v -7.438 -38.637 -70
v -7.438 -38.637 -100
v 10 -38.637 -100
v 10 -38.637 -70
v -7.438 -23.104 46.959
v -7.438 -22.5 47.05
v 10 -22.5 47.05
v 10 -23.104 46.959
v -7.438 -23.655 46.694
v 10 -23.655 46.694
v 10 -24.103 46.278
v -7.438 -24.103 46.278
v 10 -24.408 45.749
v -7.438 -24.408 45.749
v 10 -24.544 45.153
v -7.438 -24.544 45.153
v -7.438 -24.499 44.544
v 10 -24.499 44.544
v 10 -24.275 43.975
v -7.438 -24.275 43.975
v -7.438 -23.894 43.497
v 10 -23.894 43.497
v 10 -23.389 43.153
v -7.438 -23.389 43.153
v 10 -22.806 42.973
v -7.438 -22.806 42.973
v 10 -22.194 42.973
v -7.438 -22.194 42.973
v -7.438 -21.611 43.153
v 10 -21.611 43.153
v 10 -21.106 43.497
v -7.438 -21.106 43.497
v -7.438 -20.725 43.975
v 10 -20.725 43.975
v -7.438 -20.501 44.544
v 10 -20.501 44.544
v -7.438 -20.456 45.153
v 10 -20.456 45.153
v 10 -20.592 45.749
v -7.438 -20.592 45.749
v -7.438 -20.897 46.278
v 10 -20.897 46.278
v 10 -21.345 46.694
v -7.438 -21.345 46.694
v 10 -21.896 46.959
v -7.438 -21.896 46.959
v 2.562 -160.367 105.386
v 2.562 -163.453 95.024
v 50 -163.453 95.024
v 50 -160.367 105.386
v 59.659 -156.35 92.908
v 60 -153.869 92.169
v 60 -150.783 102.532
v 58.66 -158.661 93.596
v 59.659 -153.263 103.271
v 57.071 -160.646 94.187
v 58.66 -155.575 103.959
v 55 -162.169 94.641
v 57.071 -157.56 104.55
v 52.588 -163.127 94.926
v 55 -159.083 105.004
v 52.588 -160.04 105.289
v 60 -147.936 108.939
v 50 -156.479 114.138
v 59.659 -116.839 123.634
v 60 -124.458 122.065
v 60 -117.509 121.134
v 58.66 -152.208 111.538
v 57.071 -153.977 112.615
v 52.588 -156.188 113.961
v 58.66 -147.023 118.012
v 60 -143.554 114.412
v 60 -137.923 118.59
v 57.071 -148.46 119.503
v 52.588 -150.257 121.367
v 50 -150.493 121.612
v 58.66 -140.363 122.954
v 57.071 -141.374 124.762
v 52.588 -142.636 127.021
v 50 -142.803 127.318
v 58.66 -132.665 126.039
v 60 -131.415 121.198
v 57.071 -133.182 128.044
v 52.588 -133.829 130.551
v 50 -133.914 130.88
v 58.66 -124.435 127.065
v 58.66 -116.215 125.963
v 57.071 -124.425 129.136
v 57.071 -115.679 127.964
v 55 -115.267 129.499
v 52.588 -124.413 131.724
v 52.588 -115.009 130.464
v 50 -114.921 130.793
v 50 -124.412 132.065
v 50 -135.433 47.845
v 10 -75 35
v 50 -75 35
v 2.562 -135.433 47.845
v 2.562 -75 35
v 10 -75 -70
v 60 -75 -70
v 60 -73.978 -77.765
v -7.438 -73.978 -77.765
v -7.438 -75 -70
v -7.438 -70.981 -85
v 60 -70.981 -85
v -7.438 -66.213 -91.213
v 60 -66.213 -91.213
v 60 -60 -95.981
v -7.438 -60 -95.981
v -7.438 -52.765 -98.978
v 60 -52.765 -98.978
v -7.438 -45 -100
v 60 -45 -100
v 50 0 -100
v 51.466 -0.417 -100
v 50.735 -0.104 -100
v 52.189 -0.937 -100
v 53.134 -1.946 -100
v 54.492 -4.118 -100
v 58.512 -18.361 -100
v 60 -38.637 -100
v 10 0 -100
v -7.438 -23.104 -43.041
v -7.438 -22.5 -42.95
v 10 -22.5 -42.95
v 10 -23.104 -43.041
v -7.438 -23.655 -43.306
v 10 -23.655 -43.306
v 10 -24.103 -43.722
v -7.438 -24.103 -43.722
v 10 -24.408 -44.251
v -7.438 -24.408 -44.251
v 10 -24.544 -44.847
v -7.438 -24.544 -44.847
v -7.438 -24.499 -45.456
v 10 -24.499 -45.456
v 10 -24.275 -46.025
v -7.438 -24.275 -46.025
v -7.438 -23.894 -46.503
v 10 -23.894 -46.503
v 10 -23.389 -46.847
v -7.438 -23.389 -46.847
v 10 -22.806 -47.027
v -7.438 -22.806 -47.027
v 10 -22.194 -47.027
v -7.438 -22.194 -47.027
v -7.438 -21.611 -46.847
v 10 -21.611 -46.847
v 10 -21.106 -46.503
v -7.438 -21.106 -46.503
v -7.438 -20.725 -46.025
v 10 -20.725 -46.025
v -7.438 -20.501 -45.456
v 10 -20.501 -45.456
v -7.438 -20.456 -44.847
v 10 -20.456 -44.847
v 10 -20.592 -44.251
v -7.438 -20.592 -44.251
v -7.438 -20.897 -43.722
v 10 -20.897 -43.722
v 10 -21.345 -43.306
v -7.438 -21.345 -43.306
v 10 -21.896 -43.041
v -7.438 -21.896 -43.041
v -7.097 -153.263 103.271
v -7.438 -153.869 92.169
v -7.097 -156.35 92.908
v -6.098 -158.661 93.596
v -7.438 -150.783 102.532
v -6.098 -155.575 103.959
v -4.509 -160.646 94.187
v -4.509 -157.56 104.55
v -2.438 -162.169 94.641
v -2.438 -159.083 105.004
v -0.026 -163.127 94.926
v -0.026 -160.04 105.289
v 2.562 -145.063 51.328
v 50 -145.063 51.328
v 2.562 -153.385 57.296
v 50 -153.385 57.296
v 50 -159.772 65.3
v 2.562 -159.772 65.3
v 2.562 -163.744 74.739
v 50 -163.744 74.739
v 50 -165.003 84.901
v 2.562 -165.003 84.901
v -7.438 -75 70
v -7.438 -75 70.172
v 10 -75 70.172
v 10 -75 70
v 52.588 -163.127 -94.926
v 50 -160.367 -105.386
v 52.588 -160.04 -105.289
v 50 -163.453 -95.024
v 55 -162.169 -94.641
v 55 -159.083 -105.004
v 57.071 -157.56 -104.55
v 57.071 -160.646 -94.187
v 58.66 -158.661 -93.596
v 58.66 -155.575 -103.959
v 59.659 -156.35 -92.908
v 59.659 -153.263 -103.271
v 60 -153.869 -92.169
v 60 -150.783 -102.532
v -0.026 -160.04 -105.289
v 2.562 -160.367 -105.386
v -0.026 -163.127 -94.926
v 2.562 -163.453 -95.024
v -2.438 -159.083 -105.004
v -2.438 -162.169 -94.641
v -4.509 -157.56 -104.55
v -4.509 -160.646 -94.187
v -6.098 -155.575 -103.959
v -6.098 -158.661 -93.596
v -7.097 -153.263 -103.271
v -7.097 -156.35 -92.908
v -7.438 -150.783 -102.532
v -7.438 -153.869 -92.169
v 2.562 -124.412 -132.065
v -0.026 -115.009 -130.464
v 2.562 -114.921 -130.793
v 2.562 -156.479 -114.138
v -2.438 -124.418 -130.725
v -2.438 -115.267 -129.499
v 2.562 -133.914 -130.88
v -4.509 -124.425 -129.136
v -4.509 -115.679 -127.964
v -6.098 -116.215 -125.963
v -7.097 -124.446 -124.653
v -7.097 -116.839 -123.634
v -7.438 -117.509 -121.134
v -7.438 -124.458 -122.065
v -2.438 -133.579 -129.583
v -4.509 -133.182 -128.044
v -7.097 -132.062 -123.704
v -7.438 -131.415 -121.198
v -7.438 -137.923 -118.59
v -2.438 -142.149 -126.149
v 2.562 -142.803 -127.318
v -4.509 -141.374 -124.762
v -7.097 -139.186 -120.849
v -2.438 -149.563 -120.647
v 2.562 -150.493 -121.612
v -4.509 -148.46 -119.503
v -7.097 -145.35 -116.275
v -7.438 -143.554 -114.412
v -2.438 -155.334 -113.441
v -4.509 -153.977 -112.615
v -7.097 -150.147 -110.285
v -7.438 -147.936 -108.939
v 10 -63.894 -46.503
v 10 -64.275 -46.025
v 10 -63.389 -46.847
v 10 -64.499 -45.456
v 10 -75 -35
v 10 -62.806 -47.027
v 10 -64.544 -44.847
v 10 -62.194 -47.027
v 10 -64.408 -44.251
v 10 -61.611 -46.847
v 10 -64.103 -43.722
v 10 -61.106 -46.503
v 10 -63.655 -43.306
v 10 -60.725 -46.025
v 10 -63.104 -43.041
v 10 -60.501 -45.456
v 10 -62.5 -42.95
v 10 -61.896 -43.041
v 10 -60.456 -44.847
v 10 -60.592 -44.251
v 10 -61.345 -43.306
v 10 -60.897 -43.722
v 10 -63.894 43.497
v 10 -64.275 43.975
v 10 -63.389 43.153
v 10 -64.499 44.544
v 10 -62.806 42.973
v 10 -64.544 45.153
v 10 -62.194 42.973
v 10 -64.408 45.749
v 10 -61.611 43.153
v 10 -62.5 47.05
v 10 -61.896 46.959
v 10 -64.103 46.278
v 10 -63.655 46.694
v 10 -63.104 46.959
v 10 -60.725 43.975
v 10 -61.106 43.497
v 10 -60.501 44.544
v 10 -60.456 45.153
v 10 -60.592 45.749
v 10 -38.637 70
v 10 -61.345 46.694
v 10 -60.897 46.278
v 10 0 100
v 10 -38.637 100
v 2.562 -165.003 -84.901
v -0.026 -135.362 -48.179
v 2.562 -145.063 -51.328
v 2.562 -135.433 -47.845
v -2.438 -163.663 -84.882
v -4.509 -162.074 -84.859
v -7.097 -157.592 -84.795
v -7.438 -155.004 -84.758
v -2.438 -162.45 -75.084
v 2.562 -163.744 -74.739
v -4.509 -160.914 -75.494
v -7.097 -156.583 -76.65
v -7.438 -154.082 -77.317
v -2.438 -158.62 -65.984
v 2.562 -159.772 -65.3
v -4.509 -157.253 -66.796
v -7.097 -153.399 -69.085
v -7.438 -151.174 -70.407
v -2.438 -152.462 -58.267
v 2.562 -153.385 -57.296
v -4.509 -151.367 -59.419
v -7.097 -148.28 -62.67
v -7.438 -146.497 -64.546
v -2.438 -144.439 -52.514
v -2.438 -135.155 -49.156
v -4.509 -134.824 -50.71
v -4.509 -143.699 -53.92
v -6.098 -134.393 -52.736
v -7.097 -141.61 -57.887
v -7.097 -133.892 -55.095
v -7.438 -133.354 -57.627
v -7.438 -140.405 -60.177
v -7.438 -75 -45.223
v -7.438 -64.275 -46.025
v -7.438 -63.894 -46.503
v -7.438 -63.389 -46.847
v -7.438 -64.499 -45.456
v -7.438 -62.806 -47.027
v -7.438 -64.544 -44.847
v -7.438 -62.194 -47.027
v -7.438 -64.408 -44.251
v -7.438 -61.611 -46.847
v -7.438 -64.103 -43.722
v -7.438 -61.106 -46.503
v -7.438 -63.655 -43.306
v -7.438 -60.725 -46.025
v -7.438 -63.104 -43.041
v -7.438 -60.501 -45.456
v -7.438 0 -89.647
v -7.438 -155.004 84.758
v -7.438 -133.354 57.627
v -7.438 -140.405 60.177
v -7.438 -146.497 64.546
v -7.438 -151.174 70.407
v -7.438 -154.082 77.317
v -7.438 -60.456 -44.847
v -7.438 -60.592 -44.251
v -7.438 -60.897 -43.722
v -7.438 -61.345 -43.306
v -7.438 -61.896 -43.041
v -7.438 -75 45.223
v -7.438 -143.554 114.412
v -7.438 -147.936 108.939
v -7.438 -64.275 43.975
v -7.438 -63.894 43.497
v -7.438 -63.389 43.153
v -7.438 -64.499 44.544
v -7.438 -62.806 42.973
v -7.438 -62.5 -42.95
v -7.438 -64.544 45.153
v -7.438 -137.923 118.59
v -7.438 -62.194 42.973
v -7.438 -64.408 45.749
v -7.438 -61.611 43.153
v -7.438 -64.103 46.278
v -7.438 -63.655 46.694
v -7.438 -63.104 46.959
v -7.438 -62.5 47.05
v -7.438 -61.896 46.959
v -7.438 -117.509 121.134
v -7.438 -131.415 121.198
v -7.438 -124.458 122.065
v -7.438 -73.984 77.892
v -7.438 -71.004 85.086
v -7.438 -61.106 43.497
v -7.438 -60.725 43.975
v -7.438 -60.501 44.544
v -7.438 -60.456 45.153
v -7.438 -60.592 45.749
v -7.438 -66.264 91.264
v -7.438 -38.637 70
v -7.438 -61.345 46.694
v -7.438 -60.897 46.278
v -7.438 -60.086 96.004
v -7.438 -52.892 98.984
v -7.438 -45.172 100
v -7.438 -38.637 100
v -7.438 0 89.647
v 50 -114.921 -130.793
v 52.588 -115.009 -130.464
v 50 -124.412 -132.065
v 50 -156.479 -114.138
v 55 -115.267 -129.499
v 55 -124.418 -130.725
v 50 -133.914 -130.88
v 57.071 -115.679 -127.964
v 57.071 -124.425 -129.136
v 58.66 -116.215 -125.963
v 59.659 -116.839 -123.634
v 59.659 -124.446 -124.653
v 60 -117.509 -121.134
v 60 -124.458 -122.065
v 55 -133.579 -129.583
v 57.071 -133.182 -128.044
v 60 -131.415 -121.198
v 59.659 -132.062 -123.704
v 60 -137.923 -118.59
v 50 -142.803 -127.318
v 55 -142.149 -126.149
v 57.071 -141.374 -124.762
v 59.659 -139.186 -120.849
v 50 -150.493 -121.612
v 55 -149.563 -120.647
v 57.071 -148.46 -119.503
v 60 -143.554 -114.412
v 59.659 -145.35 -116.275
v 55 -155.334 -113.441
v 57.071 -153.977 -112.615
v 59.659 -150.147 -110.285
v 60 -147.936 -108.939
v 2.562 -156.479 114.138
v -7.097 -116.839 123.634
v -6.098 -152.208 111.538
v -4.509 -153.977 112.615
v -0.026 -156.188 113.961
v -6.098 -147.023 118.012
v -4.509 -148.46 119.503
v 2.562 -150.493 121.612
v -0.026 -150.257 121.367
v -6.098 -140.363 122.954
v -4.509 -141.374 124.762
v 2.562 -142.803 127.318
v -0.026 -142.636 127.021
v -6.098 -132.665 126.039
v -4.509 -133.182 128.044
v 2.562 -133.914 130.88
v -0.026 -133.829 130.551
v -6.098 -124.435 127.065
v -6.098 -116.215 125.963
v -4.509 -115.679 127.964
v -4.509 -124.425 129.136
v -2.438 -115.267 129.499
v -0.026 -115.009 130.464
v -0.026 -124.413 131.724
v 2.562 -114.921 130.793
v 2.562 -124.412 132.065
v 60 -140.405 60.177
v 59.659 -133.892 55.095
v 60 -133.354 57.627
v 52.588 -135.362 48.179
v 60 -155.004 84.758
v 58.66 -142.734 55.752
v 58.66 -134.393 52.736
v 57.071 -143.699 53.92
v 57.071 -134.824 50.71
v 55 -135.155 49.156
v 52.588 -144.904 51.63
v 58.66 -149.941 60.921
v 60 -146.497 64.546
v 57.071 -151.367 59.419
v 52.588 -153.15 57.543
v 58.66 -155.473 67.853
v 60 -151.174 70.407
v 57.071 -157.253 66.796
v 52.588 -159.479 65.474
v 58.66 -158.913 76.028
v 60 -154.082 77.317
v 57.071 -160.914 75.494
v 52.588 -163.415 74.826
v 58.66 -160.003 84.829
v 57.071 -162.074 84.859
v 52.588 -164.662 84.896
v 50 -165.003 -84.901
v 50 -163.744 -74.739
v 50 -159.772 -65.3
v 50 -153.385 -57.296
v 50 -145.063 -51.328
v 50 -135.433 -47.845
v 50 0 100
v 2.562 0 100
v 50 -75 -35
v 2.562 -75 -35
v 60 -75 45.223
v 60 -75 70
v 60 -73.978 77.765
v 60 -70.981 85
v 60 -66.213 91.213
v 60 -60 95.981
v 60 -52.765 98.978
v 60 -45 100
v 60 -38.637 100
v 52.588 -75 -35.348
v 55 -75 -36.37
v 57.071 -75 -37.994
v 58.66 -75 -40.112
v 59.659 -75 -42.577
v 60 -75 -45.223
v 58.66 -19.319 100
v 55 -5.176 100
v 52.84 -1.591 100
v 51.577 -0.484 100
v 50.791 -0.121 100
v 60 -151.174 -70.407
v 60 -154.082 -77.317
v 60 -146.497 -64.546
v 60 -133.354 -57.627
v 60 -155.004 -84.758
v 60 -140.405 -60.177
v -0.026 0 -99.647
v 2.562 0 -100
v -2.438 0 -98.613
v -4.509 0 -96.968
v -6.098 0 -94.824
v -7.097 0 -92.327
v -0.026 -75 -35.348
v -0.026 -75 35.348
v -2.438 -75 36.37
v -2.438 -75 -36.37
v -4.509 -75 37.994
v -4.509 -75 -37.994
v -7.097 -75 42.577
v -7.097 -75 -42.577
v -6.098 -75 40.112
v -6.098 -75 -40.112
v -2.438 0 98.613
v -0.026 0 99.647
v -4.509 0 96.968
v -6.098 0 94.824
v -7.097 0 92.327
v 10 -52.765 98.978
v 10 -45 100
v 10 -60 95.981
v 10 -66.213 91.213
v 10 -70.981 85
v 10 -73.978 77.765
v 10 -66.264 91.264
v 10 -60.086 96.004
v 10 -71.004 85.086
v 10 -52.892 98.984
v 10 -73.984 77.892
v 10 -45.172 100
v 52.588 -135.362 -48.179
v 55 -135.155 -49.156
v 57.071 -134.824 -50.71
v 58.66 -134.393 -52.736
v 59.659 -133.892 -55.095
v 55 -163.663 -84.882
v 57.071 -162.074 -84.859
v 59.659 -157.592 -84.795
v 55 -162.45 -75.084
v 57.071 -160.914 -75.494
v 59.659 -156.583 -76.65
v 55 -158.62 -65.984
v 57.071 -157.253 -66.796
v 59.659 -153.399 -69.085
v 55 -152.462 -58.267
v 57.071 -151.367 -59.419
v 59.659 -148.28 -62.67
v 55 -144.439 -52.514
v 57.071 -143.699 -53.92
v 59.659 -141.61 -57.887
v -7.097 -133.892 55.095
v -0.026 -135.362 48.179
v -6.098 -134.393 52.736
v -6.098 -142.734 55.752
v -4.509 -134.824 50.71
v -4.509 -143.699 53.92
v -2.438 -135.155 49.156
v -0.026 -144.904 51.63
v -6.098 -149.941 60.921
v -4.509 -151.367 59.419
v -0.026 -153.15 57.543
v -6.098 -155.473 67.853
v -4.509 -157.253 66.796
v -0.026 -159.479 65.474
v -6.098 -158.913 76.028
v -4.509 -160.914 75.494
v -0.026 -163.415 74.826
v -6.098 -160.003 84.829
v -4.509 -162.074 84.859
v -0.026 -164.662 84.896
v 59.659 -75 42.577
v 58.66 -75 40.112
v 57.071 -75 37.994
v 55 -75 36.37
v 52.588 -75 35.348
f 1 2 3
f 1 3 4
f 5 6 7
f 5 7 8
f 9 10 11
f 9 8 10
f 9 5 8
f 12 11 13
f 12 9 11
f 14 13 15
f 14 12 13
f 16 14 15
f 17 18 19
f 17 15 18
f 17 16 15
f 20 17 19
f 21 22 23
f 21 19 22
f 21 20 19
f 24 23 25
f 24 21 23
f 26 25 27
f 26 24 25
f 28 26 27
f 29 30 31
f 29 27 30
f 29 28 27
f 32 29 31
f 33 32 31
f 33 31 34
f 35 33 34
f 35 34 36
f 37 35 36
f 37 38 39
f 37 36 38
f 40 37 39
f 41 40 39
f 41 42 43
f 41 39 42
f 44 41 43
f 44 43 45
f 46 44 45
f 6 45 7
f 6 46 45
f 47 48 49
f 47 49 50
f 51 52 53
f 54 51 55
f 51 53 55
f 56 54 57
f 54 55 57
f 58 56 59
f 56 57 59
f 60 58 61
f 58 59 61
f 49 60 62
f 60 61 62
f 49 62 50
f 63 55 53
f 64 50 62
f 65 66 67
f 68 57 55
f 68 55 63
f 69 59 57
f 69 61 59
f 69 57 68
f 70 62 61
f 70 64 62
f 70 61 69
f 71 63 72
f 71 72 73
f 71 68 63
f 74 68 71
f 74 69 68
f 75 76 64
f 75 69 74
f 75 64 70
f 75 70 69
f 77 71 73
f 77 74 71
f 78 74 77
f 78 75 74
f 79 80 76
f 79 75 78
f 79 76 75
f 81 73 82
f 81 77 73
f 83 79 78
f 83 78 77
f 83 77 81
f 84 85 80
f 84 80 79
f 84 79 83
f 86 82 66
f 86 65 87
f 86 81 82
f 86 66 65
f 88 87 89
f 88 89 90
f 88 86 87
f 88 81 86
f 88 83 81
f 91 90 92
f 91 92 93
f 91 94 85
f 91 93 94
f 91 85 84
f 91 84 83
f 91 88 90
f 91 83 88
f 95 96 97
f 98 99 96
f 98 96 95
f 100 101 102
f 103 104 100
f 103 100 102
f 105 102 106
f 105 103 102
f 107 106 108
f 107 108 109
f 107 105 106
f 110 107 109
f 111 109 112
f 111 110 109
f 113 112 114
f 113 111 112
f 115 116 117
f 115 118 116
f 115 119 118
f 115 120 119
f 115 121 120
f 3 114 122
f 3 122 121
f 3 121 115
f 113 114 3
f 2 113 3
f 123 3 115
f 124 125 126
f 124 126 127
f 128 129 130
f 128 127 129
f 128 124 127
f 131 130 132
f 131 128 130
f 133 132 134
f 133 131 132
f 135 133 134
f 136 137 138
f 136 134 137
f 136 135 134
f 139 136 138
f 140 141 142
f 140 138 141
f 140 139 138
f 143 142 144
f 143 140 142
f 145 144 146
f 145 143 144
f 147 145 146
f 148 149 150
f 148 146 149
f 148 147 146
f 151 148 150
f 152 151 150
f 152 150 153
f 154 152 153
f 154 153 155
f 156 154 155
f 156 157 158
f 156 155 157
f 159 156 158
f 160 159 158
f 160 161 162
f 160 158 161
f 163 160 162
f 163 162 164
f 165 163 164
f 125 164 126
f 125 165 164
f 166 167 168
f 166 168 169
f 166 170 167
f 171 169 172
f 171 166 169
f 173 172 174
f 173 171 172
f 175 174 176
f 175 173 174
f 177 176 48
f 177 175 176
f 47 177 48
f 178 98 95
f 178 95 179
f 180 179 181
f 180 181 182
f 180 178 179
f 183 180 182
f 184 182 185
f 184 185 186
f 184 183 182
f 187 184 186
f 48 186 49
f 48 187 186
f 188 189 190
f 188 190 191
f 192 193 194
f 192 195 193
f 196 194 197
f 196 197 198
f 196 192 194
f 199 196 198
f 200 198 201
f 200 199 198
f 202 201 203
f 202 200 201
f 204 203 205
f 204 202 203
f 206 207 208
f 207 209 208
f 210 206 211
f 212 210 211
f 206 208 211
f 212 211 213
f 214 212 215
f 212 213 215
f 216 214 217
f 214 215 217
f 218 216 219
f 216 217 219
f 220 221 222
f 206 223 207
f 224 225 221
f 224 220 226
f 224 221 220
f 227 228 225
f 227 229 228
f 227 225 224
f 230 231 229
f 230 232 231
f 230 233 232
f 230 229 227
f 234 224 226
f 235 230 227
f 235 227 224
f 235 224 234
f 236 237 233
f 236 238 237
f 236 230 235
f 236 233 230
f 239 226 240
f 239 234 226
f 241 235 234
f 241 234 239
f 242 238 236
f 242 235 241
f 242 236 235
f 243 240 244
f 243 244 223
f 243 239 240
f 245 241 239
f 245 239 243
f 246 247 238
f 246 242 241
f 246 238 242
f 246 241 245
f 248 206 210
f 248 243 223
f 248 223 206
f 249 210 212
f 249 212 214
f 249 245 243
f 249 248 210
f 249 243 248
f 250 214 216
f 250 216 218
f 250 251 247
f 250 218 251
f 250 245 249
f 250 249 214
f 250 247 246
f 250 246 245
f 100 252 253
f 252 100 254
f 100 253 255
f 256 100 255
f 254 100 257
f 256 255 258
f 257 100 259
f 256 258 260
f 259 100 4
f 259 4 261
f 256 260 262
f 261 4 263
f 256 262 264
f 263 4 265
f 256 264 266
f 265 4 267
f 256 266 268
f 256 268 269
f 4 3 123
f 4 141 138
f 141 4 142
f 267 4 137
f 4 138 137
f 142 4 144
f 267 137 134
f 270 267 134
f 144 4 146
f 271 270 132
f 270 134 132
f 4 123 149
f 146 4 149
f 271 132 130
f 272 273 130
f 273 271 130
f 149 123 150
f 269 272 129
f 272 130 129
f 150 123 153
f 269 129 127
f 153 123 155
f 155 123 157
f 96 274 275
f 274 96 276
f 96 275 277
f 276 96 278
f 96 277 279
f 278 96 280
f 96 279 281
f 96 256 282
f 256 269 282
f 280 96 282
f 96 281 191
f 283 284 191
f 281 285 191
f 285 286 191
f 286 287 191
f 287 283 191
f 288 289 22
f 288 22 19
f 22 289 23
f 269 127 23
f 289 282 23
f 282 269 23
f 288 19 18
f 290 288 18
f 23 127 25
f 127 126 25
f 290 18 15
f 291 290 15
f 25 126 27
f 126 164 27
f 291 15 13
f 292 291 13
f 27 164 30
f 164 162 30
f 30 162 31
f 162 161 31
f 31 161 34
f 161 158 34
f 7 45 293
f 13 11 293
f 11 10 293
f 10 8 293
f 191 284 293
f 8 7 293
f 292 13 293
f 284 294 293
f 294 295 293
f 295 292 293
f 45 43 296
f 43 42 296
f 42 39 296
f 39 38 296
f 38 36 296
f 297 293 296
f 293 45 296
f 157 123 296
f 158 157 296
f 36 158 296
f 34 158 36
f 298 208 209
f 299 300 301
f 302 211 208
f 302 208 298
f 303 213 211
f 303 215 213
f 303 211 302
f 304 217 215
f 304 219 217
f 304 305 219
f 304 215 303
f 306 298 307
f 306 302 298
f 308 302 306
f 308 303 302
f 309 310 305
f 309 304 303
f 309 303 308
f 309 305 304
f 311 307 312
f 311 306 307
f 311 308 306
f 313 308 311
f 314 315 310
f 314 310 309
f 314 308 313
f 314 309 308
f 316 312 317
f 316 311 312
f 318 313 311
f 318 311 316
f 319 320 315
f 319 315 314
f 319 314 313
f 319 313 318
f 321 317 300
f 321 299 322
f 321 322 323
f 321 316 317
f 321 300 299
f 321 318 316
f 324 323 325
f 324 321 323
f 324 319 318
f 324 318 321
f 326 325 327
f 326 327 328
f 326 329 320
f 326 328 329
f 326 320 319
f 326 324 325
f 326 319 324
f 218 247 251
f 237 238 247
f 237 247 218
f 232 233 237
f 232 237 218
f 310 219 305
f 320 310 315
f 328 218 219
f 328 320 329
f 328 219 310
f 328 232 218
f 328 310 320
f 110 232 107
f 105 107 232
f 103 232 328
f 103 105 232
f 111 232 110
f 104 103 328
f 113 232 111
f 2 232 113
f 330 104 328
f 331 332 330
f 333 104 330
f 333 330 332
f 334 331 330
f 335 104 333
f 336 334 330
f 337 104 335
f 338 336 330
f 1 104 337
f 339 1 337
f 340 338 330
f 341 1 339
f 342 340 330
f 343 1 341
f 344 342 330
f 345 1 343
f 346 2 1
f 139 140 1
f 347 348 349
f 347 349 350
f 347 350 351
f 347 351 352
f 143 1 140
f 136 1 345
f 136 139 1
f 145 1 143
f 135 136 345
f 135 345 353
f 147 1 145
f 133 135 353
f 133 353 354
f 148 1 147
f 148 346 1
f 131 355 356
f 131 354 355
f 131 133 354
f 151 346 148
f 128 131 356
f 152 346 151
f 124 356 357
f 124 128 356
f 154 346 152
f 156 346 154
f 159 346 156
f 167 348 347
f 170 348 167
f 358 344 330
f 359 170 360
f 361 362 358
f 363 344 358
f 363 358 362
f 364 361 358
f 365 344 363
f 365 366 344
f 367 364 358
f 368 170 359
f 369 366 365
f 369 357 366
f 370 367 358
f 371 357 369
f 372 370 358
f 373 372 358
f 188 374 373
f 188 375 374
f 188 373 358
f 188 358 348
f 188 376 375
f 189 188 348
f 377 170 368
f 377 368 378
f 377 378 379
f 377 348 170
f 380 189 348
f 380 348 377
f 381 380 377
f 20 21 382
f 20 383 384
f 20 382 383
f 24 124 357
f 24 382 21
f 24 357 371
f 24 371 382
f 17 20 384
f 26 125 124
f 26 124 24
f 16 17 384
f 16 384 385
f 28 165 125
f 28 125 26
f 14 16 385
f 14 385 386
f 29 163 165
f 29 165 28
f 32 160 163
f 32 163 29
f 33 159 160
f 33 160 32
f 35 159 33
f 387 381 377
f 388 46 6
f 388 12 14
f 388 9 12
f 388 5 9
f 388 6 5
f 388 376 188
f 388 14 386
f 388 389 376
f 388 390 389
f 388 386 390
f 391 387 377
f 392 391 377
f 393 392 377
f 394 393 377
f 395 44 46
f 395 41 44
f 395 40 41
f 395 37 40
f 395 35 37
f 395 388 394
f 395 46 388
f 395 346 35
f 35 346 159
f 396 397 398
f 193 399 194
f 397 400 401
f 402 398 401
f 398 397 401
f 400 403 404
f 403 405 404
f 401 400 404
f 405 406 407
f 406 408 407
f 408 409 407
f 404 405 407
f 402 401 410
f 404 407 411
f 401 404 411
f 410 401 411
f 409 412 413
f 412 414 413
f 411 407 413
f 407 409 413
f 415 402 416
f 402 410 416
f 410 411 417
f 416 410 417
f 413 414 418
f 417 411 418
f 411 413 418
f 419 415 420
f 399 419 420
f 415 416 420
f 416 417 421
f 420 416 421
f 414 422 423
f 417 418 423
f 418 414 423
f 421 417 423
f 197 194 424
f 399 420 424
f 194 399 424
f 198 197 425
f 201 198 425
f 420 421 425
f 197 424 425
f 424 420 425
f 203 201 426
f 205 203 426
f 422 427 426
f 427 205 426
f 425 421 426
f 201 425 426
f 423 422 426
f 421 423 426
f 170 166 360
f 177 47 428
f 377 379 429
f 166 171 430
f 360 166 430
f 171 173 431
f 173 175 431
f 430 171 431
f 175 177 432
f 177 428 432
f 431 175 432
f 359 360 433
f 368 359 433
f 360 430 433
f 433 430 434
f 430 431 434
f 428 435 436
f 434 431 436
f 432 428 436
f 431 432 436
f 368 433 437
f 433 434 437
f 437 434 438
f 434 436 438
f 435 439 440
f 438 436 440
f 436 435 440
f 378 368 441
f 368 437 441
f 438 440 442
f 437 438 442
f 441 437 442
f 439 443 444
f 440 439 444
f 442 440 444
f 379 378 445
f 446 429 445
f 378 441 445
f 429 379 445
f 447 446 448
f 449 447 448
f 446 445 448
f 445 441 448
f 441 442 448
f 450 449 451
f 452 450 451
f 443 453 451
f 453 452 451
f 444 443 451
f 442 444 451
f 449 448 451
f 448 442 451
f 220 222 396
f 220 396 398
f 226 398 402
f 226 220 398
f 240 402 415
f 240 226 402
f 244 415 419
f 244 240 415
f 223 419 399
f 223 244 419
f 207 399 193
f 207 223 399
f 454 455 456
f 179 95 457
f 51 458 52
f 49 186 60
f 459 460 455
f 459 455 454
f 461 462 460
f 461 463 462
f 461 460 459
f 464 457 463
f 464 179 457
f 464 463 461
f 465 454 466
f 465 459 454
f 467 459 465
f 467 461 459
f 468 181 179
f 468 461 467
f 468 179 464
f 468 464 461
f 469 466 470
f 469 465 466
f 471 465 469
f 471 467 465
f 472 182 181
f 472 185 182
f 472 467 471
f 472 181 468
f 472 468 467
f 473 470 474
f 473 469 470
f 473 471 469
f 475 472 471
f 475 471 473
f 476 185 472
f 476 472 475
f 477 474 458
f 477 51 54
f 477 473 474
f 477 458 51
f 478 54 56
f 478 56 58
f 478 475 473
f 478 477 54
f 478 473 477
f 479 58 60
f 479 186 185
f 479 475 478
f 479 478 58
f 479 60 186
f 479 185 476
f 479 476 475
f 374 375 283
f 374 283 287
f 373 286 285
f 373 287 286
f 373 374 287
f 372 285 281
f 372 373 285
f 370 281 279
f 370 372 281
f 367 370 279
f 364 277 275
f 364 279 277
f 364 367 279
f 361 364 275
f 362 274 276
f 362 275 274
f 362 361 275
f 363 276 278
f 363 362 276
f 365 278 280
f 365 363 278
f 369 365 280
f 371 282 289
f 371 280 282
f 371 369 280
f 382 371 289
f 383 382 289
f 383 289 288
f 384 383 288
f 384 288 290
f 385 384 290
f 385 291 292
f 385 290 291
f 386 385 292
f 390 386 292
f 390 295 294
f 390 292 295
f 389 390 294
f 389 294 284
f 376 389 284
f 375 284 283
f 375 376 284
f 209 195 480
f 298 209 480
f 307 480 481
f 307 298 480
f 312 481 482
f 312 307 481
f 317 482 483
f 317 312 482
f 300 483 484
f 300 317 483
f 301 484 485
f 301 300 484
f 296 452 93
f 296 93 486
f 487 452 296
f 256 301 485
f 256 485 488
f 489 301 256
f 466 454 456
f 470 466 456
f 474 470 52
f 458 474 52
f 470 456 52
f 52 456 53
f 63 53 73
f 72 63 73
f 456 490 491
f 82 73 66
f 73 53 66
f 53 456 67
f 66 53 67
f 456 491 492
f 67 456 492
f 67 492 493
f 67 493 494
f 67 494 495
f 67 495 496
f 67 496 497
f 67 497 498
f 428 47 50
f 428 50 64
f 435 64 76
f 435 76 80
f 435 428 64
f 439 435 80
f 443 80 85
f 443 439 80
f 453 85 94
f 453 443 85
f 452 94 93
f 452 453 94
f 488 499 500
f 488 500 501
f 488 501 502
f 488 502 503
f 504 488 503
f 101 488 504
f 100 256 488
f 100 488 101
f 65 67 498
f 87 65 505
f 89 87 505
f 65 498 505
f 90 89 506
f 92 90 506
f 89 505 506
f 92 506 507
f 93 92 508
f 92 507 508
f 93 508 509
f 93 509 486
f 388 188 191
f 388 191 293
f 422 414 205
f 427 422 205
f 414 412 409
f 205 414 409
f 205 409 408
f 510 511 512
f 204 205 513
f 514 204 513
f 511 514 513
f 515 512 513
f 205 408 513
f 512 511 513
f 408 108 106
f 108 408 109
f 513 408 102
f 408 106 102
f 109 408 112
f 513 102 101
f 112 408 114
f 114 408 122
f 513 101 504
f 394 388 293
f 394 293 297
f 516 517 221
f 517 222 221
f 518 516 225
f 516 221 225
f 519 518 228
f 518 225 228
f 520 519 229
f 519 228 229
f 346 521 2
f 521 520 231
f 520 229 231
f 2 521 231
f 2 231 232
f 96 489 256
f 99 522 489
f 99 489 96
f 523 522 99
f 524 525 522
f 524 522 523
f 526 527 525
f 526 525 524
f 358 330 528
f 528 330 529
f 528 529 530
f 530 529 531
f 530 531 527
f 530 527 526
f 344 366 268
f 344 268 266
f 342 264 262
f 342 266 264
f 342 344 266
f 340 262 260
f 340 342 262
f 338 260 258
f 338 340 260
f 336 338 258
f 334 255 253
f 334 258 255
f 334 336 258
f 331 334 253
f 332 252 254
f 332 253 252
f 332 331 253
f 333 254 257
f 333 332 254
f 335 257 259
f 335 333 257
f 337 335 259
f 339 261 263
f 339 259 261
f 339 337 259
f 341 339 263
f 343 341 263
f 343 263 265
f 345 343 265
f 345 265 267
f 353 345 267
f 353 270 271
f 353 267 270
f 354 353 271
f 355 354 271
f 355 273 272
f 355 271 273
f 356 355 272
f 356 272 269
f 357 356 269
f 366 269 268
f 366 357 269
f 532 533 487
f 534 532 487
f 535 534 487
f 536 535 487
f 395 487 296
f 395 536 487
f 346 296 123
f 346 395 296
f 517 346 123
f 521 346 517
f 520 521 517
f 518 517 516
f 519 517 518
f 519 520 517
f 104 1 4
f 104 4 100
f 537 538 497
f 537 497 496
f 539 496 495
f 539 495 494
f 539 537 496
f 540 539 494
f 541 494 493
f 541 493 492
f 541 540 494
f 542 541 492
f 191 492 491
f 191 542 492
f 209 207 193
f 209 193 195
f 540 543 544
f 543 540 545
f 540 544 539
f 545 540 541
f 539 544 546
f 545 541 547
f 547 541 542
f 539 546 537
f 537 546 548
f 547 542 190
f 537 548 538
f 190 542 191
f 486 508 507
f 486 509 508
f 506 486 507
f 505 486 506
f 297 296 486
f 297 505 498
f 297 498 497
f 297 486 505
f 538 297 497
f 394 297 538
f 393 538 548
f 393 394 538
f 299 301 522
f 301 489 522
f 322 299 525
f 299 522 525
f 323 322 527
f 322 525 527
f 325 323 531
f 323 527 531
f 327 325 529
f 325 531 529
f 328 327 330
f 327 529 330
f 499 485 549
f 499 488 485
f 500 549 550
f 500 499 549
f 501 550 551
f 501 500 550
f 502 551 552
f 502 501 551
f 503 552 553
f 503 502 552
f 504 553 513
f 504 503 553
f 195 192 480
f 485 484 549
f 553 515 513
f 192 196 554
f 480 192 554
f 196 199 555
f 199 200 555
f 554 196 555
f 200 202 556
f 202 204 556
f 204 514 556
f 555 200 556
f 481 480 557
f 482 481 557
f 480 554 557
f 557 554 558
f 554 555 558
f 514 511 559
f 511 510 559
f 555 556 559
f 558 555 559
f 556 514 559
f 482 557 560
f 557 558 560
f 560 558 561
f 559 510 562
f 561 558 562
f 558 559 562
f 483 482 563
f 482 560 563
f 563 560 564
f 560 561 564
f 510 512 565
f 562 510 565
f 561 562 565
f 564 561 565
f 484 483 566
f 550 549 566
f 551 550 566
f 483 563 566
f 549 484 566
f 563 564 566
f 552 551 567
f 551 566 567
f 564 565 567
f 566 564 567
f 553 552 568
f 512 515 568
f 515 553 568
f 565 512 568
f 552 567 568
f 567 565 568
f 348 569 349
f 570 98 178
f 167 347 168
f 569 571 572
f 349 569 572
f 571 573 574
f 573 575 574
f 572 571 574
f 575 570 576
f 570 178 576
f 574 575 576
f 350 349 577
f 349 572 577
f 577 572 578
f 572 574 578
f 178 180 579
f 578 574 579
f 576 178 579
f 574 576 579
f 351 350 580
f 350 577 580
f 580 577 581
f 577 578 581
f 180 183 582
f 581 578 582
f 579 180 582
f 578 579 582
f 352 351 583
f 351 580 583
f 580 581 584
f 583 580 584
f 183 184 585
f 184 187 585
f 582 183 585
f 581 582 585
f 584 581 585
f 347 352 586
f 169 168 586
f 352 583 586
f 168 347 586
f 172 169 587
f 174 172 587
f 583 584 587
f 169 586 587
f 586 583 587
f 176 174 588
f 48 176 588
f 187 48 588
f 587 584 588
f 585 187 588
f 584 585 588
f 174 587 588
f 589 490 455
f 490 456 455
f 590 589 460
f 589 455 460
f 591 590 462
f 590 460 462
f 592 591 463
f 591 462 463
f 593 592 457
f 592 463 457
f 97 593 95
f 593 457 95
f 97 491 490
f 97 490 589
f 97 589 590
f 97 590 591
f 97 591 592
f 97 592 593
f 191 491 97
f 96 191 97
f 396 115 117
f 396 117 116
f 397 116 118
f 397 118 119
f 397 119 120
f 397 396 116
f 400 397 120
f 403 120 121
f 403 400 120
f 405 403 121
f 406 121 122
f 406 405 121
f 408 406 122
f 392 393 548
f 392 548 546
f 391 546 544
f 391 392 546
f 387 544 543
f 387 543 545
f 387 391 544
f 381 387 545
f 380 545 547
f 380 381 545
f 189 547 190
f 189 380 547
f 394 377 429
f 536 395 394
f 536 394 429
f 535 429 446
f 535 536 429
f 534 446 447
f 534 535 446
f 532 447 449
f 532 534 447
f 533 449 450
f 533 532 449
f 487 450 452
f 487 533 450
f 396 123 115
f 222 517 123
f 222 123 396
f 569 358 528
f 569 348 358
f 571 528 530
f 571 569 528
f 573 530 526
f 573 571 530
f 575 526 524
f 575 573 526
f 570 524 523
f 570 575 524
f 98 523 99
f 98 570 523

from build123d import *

# Parameters (mm, degrees)
BOSS_EXTRUDE1_DEPTH      = 10
BOSS_EXTRUDE1_DEPTH_BACK = 7.437731252
BOSS_EXTRUDE2_DEPTH      = 50
FILLET7_R                = 10
FILLET9_R                = 10
FILLET10_R               = 10
CUT_EXTRUDE1_DEPTH       = 30
CUT_EXTRUDE1_DEPTH_BACK  = 30
SKETCH5_R                = 2.05
CUT_EXTRUDE2_START       = -30
CUT_EXTRUDE2_DEPTH       = 30


with BuildPart() as part:
    # Sketch2 → Boss-Extrude1 (new, two sides: drawn at the far end of the back side and taken through both)
    with BuildSketch(Plane(origin=(0, 0, 0), x_dir=(0, 0, -1), z_dir=(1, 0, 0)).offset(-BOSS_EXTRUDE1_DEPTH_BACK)):
        with BuildLine():
            Line((100, 0), (130.792862778, -114.920528399))
            ThreePointArc((130.792862778, -114.920528399), (127.318193667, -142.802769687), (105.386466731, -160.366711677))
            Line((105.386466731, -160.366711677), (95.023521596, -163.453246629))
            ThreePointArc((95.023521596, -163.453246629), (65.300089376, -159.771732448), (47.8454422, -135.433054144))
            Line((47.8454422, -135.433054144), (35, -75))
            Line((35, -75), (-35, -75))
            Line((-35, -75), (-47.8454422, -135.433054144))
            ThreePointArc((-47.8454422, -135.433054144), (-65.300089376, -159.771732448), (-95.023521596, -163.453246629))
            Line((-95.023521596, -163.453246629), (-105.386466731, -160.366711677))
            ThreePointArc((-105.386466731, -160.366711677), (-127.318193667, -142.802769687), (-130.792862778, -114.920528399))
            Line((-130.792862778, -114.920528399), (-100, 0))
            Line((-100, 0), (-35, 0))
            Line((-35, 0), (35, 0))
            Line((35, 0), (100, 0))
        make_face()
    extrude(amount=BOSS_EXTRUDE1_DEPTH + BOSS_EXTRUDE1_DEPTH_BACK)

    # Sketch3 → Boss-Extrude2 (add)
    with BuildSketch(Plane(origin=(10, 0, 0), x_dir=(0, 0, -1), z_dir=(1, 0, 0))):
        with BuildLine():
            Line((100, 0), (130.792862778, -114.920528399))
            ThreePointArc((130.792862778, -114.920528399), (127.318193667, -142.802769687), (105.386466731, -160.366711677))
            Line((105.386466731, -160.366711677), (95.023521596, -163.453246629))
            ThreePointArc((95.023521596, -163.453246629), (65.300089376, -159.771732448), (47.8454422, -135.433054144))
            Line((47.8454422, -135.433054144), (35, -75))
            Line((35, -75), (70, -75))
            ThreePointArc((70, -75), (91.213203436, -66.213203436), (100, -45))
            Line((100, -45), (100, 0))
        make_face()
        with BuildLine():
            Line((-35, -75), (-47.8454422, -135.433054144))
            ThreePointArc((-47.8454422, -135.433054144), (-65.300089376, -159.771732448), (-95.023521596, -163.453246629))
            Line((-95.023521596, -163.453246629), (-105.386466731, -160.366711677))
            ThreePointArc((-105.386466731, -160.366711677), (-127.318193667, -142.802769687), (-130.792862778, -114.920528399))
            Line((-130.792862778, -114.920528399), (-100, 0))
            Line((-100, 0), (-100, -45))
            ThreePointArc((-100, -45), (-91.213203436, -66.213203436), (-70, -75))
            Line((-70, -75), (-35, -75))
        make_face()
    extrude(amount=BOSS_EXTRUDE2_DEPTH)

    # Fillet7
    fillet7_edges = [part.edges().sort_by_distance(p)[0] for p in [
        (60, -105.216527072, 41.4227211),
        (60, -159.771732448, 65.300089376),
        (60, -161.909979153, 100.204994164),
        (60, -142.802769687, 127.318193667),
        (60, -57.4602642, 115.396431389),
    ]]
    fillet(fillet7_edges, radius=FILLET7_R)

    # Fillet9
    fillet9_edges = [part.edges().sort_by_distance(p)[0] for p in [
        (60, -57.4602642, -115.396431389),
        (60, -159.771732448, -65.300089376),
        (60, -142.802769687, -127.318193667),
        (60, -161.909979153, -100.204994164),
        (60, -105.216527072, -41.4227211),
    ]]
    fillet(fillet9_edges, radius=FILLET9_R)

    # Fillet10
    fillet10_edges = [part.edges().sort_by_distance(p)[0] for p in [
        (-7.437731252, -57.4602642, -115.396431389),
        (-7.437731252, -142.802769687, -127.318193667),
        (-7.437731252, -161.909979153, -100.204994164),
        (-7.437731252, -159.771732448, -65.300089376),
        (-7.437731252, -105.216527072, -41.4227211),
        (-7.437731252, -57.4602642, 115.396431389),
        (-7.437731252, -142.802769687, 127.318193667),
        (-7.437731252, -161.909979153, 100.204994164),
        (-7.437731252, -159.771732448, 65.300089376),
        (-7.437731252, -105.216527072, 41.4227211),
    ]]
    fillet(fillet10_edges, radius=FILLET10_R)

    # Sketch5 → Cut-Extrude1 (cut, two sides: drawn at the far end of the back side and taken through both)
    with BuildSketch(Plane(origin=(10, 0, 0), x_dir=(0, 0, -1), z_dir=(1, 0, 0)).offset(-CUT_EXTRUDE1_DEPTH_BACK)):
        with Locations((45, -62.5)):
            Circle(SKETCH5_R)
        with Locations((-45, -62.5)):
            Circle(SKETCH5_R)
        with Locations((-45, -22.5)):
            Circle(SKETCH5_R)
        with Locations((45, -22.5)):
            Circle(SKETCH5_R)
    extrude(amount=CUT_EXTRUDE1_DEPTH + CUT_EXTRUDE1_DEPTH_BACK, mode=Mode.SUBTRACT)

    # Sketch7 → Cut-Extrude2 (cut)
    with BuildSketch(Plane(origin=(10, 0, 0), x_dir=(0, 0, -1), z_dir=(1, 0, 0)).offset(CUT_EXTRUDE2_START)):
        with BuildLine():
            Line((-70, -38.637033052), (-100, -38.637033052))
            Line((-100, -38.637033052), (-100, -45.17228394))
            ThreePointArc((-100, -45.17228394), (-91.263664233, -66.263664233), (-70.17228394, -75))
            Line((-70.17228394, -75), (-70, -75))
            Line((-70, -75), (-70, -38.637033052))
        make_face()
        with BuildLine():
            ThreePointArc((70, -75), (91.213203436, -66.213203436), (100, -45))
            Line((100, -45), (100, -38.637033052))
            Line((100, -38.637033052), (70, -38.637033052))
            Line((70, -38.637033052), (70, -75))
        make_face()
    extrude(amount=CUT_EXTRUDE2_DEPTH, mode=Mode.SUBTRACT)


solid = part.part
